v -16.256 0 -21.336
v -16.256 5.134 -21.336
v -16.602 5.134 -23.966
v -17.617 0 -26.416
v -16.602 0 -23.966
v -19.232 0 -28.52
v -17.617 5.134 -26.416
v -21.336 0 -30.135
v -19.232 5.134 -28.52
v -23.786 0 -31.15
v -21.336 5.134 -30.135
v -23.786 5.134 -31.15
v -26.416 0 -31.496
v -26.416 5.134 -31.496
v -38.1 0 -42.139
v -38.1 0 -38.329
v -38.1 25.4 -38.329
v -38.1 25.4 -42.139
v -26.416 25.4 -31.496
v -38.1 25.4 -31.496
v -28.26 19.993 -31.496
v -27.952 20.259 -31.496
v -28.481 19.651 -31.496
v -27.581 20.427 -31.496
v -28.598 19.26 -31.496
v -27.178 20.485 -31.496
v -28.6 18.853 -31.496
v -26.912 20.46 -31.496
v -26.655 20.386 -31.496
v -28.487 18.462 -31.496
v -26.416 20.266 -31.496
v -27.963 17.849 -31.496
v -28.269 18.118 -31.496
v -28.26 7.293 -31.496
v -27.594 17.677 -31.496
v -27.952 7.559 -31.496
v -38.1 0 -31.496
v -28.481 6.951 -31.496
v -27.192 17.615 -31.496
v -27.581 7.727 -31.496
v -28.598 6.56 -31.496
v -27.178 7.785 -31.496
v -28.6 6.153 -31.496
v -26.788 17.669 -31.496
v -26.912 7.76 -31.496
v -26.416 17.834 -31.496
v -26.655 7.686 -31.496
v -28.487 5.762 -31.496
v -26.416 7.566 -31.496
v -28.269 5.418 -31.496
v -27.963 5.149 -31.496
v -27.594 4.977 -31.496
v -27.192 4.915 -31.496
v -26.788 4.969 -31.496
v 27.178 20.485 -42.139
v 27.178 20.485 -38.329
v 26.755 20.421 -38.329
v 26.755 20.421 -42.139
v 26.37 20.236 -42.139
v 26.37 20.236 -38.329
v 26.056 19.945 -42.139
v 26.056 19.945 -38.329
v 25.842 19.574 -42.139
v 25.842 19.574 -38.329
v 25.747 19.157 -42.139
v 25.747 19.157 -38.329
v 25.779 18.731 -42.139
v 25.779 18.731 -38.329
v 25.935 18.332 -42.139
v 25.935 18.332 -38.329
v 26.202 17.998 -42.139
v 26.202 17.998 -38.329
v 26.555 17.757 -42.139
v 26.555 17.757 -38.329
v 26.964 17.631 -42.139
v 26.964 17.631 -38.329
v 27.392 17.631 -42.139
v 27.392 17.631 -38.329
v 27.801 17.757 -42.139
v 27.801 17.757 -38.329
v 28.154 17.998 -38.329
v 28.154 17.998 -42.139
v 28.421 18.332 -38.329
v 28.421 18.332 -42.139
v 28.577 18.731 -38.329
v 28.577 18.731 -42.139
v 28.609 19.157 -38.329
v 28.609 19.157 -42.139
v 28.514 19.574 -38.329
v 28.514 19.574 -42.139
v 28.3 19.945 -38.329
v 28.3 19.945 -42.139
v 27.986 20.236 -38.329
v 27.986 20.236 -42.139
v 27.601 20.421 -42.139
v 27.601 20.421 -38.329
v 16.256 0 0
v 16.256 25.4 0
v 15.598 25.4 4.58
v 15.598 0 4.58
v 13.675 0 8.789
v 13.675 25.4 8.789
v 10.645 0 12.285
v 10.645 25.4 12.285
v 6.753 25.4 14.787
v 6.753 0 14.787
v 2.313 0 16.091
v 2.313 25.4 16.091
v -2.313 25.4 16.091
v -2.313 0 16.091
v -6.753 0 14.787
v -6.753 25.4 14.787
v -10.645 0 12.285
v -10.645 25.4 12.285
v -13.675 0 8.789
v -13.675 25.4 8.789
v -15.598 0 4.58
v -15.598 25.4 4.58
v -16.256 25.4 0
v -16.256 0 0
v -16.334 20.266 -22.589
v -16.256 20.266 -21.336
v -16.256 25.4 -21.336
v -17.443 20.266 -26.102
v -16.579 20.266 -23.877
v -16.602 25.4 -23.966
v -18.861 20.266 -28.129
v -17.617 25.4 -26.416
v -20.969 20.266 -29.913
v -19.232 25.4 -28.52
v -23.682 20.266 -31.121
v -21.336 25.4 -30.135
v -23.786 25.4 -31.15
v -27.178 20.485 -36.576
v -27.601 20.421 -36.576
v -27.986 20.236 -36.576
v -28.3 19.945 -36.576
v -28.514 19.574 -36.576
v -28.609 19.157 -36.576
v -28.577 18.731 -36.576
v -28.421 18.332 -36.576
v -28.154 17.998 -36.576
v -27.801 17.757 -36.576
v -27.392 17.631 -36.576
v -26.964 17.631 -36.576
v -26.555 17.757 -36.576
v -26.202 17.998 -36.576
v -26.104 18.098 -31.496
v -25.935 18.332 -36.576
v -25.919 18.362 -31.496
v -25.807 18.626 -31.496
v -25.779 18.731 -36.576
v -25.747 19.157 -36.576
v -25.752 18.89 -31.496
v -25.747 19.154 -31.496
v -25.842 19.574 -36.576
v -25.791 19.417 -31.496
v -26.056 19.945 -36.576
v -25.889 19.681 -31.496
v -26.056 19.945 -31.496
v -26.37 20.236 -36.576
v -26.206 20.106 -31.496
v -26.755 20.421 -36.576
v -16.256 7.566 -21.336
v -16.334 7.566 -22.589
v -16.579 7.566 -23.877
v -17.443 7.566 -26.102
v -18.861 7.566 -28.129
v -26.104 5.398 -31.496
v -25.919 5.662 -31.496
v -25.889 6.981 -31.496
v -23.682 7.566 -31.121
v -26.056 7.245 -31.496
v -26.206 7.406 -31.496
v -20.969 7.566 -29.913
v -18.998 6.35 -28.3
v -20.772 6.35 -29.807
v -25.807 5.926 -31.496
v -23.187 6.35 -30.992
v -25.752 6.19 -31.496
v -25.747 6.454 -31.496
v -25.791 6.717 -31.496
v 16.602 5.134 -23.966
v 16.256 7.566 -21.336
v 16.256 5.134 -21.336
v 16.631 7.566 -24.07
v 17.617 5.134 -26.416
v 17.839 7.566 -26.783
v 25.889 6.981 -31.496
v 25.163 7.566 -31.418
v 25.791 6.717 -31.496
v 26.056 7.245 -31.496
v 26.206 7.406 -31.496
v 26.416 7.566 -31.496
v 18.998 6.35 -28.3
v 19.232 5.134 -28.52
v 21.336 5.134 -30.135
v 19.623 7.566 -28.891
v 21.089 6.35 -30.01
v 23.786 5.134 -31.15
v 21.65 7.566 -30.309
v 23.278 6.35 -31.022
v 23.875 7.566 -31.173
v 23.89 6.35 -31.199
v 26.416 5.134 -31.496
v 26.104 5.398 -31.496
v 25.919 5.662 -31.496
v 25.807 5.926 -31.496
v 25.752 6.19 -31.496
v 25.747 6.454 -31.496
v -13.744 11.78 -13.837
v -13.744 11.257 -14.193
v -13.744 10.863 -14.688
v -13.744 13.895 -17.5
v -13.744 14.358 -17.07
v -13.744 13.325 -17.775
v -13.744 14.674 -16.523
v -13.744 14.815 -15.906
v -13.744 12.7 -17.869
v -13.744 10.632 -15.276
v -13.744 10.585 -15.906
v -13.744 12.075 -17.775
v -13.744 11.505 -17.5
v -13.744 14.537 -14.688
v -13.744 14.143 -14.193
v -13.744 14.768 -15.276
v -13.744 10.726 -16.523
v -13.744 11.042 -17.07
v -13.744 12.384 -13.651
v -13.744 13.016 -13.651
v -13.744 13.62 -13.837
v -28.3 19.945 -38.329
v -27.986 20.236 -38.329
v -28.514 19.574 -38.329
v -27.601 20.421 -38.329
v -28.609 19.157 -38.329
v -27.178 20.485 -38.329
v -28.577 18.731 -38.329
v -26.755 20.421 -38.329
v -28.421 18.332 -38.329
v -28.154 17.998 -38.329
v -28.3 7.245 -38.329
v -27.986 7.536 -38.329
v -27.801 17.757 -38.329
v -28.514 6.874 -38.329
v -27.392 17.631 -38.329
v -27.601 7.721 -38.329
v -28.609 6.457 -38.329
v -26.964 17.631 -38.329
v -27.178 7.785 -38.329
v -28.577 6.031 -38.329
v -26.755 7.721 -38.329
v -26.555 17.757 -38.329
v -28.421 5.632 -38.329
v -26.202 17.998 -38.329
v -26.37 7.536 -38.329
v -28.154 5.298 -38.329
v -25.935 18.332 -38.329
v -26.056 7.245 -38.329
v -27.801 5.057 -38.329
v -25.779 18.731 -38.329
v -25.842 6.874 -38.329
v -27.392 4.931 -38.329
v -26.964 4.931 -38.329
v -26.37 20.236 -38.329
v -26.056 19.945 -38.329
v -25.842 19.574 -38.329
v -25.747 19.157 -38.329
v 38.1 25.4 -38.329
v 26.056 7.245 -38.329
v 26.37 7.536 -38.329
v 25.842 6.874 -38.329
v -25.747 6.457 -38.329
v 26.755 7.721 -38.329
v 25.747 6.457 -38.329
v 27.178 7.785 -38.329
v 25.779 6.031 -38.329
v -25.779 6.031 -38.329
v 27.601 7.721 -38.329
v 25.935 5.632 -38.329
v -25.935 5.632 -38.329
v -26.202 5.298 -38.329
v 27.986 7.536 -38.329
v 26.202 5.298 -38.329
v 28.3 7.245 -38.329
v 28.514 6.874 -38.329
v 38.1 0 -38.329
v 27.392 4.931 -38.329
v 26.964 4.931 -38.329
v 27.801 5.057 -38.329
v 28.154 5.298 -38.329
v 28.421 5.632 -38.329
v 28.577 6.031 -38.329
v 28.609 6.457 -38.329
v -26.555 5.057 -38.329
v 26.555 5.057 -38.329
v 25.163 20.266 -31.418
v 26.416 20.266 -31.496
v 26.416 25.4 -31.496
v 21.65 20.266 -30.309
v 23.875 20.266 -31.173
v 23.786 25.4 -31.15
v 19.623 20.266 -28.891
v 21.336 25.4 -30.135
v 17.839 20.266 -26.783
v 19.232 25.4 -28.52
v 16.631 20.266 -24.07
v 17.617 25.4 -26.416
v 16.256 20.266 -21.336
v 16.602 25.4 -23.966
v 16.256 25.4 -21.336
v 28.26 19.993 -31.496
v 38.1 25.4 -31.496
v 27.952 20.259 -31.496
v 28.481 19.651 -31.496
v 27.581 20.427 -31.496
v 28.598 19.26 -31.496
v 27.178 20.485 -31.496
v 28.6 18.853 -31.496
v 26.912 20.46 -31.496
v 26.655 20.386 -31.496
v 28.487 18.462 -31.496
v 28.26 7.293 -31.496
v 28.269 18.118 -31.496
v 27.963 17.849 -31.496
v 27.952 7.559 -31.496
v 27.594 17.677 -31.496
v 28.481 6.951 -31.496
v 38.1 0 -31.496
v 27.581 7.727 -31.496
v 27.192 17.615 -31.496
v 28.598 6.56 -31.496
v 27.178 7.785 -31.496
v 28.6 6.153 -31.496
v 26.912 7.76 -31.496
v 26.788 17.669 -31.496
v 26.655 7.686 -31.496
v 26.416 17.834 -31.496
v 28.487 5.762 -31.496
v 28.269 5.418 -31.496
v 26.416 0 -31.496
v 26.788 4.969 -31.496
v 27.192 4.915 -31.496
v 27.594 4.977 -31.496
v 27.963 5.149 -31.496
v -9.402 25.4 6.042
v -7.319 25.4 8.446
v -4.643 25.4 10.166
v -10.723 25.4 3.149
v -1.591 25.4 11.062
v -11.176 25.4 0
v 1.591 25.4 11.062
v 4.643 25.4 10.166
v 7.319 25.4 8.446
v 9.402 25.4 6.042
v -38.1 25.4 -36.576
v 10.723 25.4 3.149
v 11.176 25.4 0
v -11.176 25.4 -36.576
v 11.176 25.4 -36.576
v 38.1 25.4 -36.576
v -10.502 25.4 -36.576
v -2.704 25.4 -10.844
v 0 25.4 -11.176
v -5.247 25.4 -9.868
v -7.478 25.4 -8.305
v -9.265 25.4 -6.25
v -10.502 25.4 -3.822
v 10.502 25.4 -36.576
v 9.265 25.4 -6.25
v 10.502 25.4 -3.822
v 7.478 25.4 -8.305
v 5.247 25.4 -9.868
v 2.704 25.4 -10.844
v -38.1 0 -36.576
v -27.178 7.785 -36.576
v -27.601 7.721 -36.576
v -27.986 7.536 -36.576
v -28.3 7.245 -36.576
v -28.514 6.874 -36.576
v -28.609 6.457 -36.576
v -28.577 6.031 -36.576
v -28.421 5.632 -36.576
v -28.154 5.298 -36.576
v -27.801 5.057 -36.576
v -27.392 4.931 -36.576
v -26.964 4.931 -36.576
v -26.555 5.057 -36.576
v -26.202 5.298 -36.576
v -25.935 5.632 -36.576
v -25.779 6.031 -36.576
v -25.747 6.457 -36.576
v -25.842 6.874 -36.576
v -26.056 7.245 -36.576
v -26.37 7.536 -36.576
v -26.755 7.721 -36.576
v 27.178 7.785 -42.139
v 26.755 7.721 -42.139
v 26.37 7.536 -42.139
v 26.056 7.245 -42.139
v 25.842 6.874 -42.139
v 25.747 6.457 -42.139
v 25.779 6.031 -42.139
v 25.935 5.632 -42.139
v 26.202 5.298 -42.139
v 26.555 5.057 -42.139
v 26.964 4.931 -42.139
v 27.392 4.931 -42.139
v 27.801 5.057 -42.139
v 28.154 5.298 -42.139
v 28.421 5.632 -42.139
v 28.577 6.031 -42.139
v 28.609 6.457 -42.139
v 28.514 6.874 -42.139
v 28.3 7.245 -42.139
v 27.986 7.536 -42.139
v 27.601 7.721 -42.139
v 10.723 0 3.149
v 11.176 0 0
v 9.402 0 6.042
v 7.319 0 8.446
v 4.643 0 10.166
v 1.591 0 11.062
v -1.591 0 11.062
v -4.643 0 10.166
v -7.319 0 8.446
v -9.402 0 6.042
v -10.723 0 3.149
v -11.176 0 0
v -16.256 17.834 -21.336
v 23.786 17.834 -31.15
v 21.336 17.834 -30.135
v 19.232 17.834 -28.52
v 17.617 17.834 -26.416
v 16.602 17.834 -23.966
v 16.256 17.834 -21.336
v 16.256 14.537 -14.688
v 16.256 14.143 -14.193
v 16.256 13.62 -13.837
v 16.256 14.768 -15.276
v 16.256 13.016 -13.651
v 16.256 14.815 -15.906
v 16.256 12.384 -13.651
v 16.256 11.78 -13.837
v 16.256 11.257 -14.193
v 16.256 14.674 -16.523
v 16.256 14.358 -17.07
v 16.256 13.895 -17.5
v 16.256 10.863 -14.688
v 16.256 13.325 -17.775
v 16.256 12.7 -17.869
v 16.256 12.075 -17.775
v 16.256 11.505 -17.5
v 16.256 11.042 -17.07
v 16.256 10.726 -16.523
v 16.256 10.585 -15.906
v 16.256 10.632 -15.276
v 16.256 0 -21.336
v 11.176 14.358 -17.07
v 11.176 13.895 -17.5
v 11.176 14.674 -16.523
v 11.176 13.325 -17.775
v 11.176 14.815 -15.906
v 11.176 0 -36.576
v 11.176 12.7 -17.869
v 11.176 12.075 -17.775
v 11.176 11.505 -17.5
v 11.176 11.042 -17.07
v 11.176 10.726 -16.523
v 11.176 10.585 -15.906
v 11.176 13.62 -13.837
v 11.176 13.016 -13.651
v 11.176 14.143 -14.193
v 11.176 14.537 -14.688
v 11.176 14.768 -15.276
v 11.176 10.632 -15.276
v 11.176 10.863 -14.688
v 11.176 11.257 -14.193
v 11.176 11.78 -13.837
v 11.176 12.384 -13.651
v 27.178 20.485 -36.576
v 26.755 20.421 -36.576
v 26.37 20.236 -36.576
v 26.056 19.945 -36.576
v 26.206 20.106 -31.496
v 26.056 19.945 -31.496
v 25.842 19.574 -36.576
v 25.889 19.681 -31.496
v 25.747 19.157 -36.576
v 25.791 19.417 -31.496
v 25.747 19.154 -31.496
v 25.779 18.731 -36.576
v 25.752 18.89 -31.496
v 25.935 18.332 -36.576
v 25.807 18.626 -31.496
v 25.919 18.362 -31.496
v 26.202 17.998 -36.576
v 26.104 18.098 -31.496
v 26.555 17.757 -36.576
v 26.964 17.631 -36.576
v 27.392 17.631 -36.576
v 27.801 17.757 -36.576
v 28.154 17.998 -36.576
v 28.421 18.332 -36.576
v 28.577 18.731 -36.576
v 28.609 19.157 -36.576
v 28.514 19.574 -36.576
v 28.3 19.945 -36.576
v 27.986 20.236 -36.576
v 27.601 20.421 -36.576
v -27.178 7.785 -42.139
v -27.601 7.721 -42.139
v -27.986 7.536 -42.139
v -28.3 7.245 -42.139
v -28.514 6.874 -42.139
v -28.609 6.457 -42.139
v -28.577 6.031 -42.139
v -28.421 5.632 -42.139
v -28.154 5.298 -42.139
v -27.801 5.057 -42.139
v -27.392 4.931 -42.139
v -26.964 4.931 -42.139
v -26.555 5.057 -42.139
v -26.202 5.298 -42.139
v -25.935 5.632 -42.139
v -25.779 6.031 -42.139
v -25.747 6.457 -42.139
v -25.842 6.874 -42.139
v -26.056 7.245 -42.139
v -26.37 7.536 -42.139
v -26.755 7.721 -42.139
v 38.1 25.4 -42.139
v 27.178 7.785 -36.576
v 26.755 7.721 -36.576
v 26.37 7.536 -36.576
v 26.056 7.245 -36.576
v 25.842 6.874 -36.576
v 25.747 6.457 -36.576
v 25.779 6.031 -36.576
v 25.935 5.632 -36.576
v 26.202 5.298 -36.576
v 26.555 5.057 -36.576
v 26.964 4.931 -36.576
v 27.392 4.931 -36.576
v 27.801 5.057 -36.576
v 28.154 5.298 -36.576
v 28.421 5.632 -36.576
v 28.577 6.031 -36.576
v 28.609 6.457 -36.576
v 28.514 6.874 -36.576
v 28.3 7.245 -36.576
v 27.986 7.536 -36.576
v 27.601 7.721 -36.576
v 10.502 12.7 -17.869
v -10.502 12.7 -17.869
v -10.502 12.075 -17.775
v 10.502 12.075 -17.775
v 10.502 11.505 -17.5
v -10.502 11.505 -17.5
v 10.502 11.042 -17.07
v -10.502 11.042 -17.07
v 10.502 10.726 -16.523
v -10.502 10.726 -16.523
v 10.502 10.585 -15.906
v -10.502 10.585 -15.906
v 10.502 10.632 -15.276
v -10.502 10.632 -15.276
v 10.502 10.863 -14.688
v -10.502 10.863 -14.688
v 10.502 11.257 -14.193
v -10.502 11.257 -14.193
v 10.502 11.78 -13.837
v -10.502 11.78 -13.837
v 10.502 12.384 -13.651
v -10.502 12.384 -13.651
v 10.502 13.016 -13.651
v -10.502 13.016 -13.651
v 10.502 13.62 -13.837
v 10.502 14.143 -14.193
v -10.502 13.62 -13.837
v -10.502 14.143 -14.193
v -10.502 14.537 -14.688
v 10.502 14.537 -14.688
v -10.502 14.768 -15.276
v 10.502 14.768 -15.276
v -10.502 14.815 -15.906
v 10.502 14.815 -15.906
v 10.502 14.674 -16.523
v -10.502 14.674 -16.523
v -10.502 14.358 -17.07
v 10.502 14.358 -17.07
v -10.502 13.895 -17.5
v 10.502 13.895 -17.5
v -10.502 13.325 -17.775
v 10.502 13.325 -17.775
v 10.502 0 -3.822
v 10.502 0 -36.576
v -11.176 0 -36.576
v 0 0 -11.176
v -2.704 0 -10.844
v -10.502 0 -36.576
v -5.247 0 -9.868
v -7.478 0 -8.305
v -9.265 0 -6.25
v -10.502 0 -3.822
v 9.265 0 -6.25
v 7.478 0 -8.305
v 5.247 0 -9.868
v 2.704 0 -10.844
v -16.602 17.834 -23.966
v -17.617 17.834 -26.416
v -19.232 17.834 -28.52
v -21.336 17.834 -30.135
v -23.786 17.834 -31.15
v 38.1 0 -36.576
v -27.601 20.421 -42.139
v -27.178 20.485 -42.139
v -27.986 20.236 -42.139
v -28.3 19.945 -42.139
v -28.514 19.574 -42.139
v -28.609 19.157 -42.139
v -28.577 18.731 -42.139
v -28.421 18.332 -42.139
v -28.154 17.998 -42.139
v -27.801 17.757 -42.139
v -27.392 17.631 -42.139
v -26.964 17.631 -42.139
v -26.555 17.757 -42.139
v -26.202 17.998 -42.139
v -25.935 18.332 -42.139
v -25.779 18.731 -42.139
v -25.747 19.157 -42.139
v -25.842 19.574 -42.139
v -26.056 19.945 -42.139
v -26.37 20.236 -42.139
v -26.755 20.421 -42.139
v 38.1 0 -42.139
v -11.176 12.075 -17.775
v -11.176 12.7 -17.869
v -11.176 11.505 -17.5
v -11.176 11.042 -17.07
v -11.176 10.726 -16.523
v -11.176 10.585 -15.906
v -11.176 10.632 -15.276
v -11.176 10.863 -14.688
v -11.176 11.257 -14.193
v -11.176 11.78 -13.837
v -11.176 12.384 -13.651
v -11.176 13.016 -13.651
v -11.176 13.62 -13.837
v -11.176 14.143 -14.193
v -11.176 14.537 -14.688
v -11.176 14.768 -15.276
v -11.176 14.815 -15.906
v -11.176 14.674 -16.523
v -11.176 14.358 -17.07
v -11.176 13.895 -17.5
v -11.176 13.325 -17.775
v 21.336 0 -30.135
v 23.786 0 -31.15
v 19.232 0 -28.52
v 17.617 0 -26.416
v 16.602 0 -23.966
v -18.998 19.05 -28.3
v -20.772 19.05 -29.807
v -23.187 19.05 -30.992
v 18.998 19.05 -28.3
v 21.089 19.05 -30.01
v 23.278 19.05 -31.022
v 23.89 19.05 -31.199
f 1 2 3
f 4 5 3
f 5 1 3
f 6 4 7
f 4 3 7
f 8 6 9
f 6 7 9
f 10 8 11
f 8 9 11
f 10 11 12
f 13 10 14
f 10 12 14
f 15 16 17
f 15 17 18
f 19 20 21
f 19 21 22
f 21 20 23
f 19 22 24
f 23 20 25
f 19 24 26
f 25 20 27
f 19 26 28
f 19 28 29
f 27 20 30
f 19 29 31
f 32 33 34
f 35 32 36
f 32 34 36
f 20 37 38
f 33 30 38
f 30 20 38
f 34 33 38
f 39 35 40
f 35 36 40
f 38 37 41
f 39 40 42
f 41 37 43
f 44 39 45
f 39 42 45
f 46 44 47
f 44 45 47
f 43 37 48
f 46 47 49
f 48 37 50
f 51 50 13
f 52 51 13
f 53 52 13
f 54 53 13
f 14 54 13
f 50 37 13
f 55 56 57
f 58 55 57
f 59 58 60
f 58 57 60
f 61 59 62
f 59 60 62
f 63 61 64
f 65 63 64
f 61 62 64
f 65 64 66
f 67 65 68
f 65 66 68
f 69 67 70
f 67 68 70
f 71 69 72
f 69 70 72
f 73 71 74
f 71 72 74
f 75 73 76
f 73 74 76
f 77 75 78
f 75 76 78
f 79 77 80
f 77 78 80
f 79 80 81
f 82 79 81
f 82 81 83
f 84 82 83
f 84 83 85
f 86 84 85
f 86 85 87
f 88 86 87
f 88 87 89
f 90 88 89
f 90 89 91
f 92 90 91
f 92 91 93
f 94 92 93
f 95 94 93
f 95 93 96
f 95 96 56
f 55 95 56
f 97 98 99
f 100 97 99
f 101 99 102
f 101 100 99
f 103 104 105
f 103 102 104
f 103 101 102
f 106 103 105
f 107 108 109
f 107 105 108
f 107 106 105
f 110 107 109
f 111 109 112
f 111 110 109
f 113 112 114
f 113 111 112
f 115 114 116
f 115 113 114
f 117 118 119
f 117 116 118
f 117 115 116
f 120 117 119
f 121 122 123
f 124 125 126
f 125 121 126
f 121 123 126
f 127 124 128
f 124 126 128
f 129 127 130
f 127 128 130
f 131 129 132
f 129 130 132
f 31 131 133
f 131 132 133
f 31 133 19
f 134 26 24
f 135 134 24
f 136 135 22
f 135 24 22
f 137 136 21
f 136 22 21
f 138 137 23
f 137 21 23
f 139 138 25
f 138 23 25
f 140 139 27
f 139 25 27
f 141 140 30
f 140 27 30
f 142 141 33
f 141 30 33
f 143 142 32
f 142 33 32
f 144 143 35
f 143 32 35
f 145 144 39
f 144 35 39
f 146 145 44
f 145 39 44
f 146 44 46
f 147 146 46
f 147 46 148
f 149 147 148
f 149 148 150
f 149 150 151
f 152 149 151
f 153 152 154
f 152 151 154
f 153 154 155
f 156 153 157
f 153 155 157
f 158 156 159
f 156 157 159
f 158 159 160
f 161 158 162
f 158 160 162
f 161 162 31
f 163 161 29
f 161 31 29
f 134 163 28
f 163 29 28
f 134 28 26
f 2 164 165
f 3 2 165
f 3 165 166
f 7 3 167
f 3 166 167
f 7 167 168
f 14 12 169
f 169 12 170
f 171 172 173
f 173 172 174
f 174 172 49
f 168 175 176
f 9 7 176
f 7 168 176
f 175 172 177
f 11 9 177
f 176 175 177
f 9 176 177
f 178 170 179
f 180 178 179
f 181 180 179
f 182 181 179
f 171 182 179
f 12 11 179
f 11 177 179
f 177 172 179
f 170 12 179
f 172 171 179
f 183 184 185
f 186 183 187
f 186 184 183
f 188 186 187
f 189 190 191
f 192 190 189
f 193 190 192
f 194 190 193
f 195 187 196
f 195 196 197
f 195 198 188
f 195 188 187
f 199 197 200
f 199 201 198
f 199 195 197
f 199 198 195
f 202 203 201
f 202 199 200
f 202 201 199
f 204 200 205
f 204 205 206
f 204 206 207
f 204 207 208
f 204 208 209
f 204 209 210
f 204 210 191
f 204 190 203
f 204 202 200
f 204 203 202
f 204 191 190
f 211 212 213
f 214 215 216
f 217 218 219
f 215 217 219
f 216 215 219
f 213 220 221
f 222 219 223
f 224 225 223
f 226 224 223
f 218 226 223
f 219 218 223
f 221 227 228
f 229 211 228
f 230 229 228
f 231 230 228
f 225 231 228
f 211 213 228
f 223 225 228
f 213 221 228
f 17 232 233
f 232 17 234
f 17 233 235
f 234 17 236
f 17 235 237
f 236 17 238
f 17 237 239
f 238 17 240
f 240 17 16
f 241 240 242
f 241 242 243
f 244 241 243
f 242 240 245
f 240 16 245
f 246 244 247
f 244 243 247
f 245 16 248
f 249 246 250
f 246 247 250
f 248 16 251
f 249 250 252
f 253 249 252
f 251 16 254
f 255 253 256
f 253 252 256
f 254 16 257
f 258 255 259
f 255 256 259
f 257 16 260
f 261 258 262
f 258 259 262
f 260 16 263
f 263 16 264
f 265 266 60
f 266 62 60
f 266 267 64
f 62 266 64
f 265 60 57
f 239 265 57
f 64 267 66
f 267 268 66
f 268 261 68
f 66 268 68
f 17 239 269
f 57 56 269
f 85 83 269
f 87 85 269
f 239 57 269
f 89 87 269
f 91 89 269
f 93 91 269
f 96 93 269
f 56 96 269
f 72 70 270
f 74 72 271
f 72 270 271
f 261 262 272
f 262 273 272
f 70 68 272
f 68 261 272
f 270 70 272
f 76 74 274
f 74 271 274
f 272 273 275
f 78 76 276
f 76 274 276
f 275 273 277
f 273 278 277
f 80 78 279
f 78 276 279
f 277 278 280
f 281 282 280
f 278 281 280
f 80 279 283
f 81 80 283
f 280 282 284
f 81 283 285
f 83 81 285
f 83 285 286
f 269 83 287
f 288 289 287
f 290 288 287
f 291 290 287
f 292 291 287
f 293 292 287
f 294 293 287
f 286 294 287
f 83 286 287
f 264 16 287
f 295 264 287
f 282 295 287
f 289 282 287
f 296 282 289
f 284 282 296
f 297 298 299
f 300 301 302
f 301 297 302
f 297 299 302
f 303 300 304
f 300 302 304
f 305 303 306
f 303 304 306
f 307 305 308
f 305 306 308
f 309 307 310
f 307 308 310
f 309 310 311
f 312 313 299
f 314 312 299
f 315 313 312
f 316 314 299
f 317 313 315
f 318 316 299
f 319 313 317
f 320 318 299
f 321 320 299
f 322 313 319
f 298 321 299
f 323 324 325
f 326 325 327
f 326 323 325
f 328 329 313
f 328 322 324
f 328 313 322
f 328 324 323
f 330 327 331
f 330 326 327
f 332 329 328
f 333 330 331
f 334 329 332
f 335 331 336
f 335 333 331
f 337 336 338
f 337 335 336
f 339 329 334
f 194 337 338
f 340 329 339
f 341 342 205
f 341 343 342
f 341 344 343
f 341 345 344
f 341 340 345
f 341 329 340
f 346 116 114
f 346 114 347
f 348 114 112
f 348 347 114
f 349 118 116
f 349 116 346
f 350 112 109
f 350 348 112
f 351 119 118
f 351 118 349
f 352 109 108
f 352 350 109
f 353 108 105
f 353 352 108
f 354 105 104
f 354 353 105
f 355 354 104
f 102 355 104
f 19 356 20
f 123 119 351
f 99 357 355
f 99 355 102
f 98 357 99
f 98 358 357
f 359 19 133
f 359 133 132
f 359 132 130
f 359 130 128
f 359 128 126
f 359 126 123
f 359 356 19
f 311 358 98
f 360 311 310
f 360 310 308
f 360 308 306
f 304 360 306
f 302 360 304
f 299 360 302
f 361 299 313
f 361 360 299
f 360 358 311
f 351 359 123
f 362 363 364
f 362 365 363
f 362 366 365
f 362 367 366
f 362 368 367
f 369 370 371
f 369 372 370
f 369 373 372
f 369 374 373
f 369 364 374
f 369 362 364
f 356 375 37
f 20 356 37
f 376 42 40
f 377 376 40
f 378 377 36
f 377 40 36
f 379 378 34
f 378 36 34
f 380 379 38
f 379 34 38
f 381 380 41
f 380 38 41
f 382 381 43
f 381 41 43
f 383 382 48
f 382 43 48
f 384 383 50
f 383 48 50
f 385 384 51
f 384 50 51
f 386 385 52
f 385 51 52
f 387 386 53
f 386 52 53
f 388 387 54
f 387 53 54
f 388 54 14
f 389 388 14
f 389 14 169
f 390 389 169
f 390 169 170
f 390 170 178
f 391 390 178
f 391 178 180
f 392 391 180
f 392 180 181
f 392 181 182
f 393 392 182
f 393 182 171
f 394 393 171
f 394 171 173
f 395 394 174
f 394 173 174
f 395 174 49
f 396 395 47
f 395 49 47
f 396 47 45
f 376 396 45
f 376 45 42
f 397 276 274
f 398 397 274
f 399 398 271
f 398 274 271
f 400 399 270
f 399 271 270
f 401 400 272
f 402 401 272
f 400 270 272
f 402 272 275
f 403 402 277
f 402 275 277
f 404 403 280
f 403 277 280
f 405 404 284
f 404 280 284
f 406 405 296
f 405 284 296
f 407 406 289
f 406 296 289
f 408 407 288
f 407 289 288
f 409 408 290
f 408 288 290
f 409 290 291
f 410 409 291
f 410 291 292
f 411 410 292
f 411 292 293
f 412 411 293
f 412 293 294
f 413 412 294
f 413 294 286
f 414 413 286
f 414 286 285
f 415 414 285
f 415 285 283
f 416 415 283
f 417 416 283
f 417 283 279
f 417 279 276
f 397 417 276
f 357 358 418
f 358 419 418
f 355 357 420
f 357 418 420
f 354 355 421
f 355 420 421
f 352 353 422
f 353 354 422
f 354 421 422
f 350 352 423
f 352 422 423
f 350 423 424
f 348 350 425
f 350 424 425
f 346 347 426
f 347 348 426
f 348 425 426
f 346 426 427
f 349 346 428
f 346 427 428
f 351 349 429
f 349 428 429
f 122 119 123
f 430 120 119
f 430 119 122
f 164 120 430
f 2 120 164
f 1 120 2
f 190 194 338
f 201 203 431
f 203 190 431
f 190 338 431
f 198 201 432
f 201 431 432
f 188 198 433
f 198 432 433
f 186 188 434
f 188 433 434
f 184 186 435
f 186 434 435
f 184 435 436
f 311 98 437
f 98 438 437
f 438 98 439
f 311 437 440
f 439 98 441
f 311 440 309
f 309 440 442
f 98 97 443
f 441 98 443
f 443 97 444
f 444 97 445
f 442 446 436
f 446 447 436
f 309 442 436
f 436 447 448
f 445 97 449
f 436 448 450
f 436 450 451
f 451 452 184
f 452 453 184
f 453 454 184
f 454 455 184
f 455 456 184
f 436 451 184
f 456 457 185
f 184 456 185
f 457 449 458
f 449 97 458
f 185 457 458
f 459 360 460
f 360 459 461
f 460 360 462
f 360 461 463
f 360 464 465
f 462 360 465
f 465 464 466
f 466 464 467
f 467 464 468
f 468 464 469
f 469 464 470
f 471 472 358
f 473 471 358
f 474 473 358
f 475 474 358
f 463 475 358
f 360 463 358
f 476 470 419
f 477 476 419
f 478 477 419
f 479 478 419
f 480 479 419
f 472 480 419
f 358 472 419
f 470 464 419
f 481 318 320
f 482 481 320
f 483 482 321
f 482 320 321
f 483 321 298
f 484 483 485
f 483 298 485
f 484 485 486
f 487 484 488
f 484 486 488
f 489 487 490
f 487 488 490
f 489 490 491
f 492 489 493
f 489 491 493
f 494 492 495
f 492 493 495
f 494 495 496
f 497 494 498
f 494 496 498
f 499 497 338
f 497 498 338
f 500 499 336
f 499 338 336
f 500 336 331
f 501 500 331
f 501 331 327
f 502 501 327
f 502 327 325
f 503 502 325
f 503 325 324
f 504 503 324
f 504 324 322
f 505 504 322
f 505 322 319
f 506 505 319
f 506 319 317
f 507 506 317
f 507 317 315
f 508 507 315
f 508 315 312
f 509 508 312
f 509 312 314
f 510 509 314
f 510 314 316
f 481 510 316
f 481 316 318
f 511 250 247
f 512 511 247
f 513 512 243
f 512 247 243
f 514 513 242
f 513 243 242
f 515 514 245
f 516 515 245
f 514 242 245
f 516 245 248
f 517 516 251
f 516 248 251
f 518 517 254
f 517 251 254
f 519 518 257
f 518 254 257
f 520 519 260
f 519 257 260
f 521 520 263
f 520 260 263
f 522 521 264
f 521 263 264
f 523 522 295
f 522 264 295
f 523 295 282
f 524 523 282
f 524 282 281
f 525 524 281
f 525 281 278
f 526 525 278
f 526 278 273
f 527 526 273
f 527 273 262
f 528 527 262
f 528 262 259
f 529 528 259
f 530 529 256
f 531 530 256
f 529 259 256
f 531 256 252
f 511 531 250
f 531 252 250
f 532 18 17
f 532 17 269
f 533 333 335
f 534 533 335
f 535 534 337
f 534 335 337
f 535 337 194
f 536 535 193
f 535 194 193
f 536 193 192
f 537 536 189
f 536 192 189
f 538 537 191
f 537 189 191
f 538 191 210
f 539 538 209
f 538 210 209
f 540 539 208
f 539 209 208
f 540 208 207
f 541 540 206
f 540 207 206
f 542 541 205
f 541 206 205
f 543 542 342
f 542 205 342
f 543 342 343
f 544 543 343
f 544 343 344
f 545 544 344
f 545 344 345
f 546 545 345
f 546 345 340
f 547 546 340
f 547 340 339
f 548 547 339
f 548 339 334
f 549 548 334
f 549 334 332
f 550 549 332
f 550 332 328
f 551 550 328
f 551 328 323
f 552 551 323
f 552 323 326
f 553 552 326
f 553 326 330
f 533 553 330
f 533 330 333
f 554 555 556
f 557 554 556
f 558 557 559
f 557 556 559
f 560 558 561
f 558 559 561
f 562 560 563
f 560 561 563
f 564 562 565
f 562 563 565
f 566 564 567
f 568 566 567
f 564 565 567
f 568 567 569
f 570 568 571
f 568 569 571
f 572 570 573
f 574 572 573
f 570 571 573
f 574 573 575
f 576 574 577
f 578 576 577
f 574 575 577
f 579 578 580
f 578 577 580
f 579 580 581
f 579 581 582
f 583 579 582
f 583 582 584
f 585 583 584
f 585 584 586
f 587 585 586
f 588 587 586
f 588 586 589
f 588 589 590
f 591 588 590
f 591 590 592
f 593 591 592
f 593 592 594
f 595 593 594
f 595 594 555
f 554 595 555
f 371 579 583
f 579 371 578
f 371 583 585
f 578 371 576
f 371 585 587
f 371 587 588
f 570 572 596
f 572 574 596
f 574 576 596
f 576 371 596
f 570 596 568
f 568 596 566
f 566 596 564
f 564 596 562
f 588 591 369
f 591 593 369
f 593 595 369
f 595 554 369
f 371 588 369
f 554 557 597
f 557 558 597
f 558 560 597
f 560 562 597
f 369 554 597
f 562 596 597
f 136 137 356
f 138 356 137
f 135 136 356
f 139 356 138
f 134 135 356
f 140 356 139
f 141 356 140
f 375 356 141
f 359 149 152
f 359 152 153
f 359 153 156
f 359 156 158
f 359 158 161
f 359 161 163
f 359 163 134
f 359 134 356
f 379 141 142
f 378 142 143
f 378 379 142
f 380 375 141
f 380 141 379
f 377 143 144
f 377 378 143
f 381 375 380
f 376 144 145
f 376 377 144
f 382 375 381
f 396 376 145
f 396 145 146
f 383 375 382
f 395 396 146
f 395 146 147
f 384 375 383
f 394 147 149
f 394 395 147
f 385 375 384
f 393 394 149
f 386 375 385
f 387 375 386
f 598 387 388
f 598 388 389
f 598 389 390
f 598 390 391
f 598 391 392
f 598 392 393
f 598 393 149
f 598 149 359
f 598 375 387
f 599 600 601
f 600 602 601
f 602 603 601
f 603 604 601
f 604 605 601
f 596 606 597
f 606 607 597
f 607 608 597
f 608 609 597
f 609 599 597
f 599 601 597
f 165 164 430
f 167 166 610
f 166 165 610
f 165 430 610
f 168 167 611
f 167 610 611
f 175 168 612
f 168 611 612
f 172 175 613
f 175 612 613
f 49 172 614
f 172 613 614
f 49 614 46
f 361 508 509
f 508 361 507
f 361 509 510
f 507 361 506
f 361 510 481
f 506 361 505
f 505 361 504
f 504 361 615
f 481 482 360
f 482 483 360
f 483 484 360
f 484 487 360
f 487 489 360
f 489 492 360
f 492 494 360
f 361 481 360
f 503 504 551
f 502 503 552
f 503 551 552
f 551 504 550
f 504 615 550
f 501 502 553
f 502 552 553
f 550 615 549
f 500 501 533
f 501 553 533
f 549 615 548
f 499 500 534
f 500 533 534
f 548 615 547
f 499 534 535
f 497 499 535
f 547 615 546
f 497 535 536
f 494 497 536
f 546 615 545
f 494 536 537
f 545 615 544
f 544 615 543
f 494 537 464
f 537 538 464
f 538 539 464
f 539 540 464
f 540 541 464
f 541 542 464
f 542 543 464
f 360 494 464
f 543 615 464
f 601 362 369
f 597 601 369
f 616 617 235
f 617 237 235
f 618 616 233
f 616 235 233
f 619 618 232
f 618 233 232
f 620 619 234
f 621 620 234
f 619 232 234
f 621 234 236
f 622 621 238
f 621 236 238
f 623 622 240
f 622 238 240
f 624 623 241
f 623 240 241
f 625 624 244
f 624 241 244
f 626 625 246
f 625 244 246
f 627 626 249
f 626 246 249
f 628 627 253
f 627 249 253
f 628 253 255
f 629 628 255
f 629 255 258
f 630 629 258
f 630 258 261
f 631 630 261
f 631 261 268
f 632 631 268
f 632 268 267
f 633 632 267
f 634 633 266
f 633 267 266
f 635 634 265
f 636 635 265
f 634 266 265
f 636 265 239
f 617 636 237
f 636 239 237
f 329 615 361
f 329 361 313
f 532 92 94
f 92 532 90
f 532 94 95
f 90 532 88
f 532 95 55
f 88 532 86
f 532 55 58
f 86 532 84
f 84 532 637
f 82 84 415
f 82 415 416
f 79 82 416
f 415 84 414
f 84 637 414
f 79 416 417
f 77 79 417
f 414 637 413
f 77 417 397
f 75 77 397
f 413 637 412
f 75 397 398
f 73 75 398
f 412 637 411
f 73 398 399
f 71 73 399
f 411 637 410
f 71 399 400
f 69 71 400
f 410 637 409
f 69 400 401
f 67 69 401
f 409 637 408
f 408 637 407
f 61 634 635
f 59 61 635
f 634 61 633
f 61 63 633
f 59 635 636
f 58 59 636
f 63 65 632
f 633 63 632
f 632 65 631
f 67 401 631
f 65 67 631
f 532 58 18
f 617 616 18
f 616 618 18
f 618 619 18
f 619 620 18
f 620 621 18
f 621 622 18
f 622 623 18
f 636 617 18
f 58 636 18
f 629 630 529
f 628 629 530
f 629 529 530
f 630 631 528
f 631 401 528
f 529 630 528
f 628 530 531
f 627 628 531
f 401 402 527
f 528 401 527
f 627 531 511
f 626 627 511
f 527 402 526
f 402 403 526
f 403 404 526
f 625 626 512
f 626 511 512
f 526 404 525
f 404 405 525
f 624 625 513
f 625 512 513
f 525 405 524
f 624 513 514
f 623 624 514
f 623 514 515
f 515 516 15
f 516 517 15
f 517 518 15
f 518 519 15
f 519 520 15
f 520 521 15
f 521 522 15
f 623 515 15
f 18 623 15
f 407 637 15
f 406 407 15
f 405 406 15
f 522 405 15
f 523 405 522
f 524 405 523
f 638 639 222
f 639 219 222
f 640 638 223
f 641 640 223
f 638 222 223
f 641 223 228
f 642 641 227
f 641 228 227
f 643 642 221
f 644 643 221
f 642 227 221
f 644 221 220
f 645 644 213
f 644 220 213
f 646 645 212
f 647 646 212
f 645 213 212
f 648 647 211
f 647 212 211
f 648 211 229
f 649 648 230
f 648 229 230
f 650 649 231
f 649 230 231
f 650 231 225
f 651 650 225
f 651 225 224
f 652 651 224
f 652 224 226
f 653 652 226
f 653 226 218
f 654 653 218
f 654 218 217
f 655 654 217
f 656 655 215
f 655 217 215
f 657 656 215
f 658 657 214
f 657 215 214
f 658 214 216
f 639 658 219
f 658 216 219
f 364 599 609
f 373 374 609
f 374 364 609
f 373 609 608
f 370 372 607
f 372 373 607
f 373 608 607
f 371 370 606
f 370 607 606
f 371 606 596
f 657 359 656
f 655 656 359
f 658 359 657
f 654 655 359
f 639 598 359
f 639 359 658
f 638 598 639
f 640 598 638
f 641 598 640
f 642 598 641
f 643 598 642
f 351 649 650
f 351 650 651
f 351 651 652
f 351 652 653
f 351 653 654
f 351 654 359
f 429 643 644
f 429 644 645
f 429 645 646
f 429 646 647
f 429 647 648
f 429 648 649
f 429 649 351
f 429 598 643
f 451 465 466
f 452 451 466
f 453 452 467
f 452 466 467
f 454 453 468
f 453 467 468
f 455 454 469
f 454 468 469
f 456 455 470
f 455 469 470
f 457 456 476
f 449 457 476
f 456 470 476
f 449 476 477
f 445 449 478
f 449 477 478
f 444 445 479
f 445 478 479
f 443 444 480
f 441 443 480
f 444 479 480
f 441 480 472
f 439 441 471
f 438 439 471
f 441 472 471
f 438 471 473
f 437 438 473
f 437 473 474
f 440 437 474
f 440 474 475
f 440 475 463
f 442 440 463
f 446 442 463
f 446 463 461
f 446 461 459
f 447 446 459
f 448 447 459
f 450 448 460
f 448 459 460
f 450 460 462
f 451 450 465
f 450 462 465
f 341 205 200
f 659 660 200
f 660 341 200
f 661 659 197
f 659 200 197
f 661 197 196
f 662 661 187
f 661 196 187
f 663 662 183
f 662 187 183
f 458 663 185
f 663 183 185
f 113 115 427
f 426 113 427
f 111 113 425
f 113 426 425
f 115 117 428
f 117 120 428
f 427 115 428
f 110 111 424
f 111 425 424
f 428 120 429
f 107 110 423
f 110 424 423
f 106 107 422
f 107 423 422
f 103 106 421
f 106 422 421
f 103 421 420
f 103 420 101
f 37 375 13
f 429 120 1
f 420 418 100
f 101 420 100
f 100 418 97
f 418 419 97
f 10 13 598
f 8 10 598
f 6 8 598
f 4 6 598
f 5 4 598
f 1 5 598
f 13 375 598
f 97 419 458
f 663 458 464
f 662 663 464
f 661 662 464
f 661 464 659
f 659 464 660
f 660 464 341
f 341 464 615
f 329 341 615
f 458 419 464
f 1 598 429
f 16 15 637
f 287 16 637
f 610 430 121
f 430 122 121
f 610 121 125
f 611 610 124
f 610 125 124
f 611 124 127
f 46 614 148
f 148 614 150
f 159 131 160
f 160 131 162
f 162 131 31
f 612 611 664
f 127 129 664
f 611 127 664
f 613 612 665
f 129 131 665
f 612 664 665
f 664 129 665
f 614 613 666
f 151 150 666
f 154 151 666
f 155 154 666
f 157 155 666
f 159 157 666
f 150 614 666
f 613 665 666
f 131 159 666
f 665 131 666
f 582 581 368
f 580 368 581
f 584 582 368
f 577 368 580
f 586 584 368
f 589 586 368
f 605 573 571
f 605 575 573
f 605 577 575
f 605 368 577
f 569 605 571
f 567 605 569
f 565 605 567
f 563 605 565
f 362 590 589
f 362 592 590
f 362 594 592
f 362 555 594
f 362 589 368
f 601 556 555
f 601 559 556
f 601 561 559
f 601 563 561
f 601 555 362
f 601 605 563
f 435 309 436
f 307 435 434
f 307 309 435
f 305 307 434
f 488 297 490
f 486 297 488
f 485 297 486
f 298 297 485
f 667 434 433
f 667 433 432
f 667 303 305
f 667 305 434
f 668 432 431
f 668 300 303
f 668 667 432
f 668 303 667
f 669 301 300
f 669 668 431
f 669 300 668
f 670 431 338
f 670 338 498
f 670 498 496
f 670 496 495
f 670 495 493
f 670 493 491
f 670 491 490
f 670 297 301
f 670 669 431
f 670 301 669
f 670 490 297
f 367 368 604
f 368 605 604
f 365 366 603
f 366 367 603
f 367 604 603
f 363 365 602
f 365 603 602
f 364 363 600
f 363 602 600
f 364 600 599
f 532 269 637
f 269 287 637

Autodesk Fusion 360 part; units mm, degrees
sketch "Sketch1" plane through (0, 0, 0) normal (0, 1, 0) x (1, 0, 0)
  circle A0 centre (0, 0) radius 9.525 construction
  circle A1 centre (0, 0) radius 11.176 construction
  line L0 (0, 0) -> (0, 36.576)
  line L1 (0, 36.576) -> (38.1, 36.576) construction
  line L2 (38.1, 36.576) -> (38.1, 38.3286) construction
  line L3 (38.1, 38.3286) -> (0, 38.3286) construction
  line L4 (0, 38.3286) -> (0, 36.576) construction
  line L5 (0, 36.576) -> (-38.1, 36.576) construction
  line L6 (-38.1, 38.3286) -> (0, 38.3286) construction
  line L7 (-38.1, 36.576) -> (-38.1, 38.3286) construction
  line L8 (0, 38.3286) -> (38.1, 38.3286)
  line L9 (38.1, 38.3286) -> (38.1, 42.1386)
  line L10 (38.1, 42.1386) -> (0, 42.1386)
  line L11 (0, 42.1386) -> (0, 38.3286)
  line L12 (-38.1, 42.1386) -> (0, 42.1386)
  line L13 (0, 38.3286) -> (-38.1, 38.3286)
  line L14 (-38.1, 38.3286) -> (-38.1, 42.1386)
  line L15 (0, 0) -> (11.176, 0)
  line L16 (0, 0) -> (-11.176, 0)
  line L17 (11.176, 0) -> (16.256, 0) construction
  line L18 (16.256, 0) -> (16.256, 36.576)
  line L19 (16.256, 36.576) -> (11.176, 36.576)
  line L20 (11.176, 36.576) -> (11.176, 0)
  arc A2 (0, -16.256) -> (16.256, 0) centre (0, 0) ccw
  line L21 (0, 0) -> (0, -16.256) construction
  line L22 (0, 0) -> (16.256, 0) construction
  arc A3 (0, -11.176) -> (11.176, 0) centre (0, 0) ccw
  arc A4 (-16.256, 0) -> (0, -16.256) centre (0, 0) ccw
  arc A5 (-11.176, 0) -> (0, -11.176) centre (0, 0) ccw
  line L23 (-16.256, 0) -> (-16.256, 36.576)
  line L24 (-11.176, 36.576) -> (-11.176, 0)
  line L25 (-16.256, 36.576) -> (-11.176, 36.576)
  line L26 (0, 11.176) -> (0, 36.576)
  arc A6 (10.502, 3.8224) -> (0, 11.176) centre (0, 0) ccw
  line L27 (0, 0) -> (10.502, 3.8224) construction
  line L28 (0, 0) -> (0, 11.176) construction
  line L29 (10.502, 3.8224) -> (10.502, 36.576)
  line L30 (10.502, 36.576) -> (0, 36.576)
  arc A7 (0, 11.176) -> (-10.502, 3.8224) centre (0, 0) ccw
  line L31 (-10.502, 3.8224) -> (-10.502, 36.576)
  line L32 (-10.502, 36.576) -> (0, 36.576)
  line L33 (16.256, 36.576) -> (38.1, 36.576)
  line L34 (38.1, 36.576) -> (38.1, 31.496)
  line L35 (38.1, 31.496) -> (16.256, 31.496)
  line L36 (16.256, 31.496) -> (16.256, 36.576)
  line L37 (-38.1, 31.496) -> (-16.256, 31.496)
  line L38 (-38.1, 36.576) -> (-38.1, 31.496)
  line L39 (-16.256, 36.576) -> (-38.1, 36.576)
  dimension "d1" = 19.05
  dimension "d2" = 22.352
  dimension "d3" = 36.576
  dimension "d4" = 38.1
  dimension "d5" = 1.7526
  dimension "d6" = 38.1
  dimension "d7" = 3.81
  dimension "d8" = 5.08
  dimension "d9" = 36.576
  dimension "d10" = 90
  dimension "d11" = 70
  dimension "d12" = 5.08
  dimension "d13" = 21.844
extrude "Extrude1" add sketch "Sketch1" along normal blind 25.4 contours L18 L19 L20 A2 A3 A4 A5 L23 L24 L25 L36 | L18 L33 L34 L35 L36 | L23 L37 L38 L39 | L8 L9 L10 L11 | L11 L12 L13 L14 makes body 1 at (-16.1752, 8.4667, 1.6186) makes body 2 at (12.7, 8.4667, -42.1386)
extrude "Extrude2" add sketch "Sketch1" along normal blind 25.4 separate body contours L0 L26 A7 L31 L32 | L0 L26 A6 L29 L30 makes body 3
sketch "Sketch3" plane through (16.256, 0, 0) normal (1, 0, 0) x (0, 1, 0)
  line L0 (0, 0) -> (0, -31.496)
  line L1 (0, -31.496) -> (25.4, -31.496)
  line L2 (25.4, -31.496) -> (25.4, 0)
  line L3 (25.4, 0) -> (0, 0)
  line L4 (25.4, 0) -> (0, 0) construction
  line L5 (0, 0) -> (0, -31.496) construction
  line L6 (0, -31.496) -> (25.4, -31.496) construction
  line L7 (25.4, -31.496) -> (25.4, 0) construction
  line L8 (12.7, 0) -> (12.7, -31.496) construction
  line L9 (0, -15.748) -> (25.4, -15.748) construction
  point P0 (12.7, -15.748)
sketch "Sketch5" plane through (0, 0, -42.1386) normal (0, 0, -1) x (1, 0, 0)
  line L0 (38.1, 0) -> (-38.1, 0)
  line L1 (-38.1, 0) -> (-38.1, -25.4)
  line L2 (-38.1, -25.4) -> (38.1, -25.4)
  line L3 (38.1, -25.4) -> (38.1, 0)
  line L4 (-38.1, -25.4) -> (-16.256, -25.4)
  line L5 (-16.256, -25.4) -> (-16.256, 0)
  line L6 (-16.256, 0) -> (-38.1, 0)
  line L7 (-38.1, 0) -> (-38.1, -25.4)
  line L8 (0, 0) -> (0, -25.4)
  line L9 (-27.178, -25.4) -> (-27.178, 0)
  line L10 (-16.256, -12.7) -> (-38.1, -12.7)
  point P0 (-27.178, -19.05)
  point P1 (-27.178, -6.35)
  point P2 (27.178, -19.05)
  point P3 (27.178, -6.35)
  dimension "d30" = 21.844
  dimension "d31" = 25.4
  dimension "d32" = 6.35
hole "Hole3" at (27.178, 19.05, -42.1386) at (27.178, 6.35, -42.1386) at (-27.178, 19.05, -42.1386) at (-27.178, 6.35, -42.1386) direction (0, 0, 1) diameter 2.8702 depth 11.1125 tip angle 180 bodies 1 2
hole "Hole4" at (16.256, 12.7, -15.748) direction (-1, 0, 0) diameter 4.2418 depth 30 tip angle 180 bodies 1 3
fillet "Fillet1" radius 10.16 2 edges at (-16.256, 12.7, -31.496) (16.256, 12.7, -31.496) on bodies 1
equation "d33 = ( 7 / 16 ) * 1 in"
